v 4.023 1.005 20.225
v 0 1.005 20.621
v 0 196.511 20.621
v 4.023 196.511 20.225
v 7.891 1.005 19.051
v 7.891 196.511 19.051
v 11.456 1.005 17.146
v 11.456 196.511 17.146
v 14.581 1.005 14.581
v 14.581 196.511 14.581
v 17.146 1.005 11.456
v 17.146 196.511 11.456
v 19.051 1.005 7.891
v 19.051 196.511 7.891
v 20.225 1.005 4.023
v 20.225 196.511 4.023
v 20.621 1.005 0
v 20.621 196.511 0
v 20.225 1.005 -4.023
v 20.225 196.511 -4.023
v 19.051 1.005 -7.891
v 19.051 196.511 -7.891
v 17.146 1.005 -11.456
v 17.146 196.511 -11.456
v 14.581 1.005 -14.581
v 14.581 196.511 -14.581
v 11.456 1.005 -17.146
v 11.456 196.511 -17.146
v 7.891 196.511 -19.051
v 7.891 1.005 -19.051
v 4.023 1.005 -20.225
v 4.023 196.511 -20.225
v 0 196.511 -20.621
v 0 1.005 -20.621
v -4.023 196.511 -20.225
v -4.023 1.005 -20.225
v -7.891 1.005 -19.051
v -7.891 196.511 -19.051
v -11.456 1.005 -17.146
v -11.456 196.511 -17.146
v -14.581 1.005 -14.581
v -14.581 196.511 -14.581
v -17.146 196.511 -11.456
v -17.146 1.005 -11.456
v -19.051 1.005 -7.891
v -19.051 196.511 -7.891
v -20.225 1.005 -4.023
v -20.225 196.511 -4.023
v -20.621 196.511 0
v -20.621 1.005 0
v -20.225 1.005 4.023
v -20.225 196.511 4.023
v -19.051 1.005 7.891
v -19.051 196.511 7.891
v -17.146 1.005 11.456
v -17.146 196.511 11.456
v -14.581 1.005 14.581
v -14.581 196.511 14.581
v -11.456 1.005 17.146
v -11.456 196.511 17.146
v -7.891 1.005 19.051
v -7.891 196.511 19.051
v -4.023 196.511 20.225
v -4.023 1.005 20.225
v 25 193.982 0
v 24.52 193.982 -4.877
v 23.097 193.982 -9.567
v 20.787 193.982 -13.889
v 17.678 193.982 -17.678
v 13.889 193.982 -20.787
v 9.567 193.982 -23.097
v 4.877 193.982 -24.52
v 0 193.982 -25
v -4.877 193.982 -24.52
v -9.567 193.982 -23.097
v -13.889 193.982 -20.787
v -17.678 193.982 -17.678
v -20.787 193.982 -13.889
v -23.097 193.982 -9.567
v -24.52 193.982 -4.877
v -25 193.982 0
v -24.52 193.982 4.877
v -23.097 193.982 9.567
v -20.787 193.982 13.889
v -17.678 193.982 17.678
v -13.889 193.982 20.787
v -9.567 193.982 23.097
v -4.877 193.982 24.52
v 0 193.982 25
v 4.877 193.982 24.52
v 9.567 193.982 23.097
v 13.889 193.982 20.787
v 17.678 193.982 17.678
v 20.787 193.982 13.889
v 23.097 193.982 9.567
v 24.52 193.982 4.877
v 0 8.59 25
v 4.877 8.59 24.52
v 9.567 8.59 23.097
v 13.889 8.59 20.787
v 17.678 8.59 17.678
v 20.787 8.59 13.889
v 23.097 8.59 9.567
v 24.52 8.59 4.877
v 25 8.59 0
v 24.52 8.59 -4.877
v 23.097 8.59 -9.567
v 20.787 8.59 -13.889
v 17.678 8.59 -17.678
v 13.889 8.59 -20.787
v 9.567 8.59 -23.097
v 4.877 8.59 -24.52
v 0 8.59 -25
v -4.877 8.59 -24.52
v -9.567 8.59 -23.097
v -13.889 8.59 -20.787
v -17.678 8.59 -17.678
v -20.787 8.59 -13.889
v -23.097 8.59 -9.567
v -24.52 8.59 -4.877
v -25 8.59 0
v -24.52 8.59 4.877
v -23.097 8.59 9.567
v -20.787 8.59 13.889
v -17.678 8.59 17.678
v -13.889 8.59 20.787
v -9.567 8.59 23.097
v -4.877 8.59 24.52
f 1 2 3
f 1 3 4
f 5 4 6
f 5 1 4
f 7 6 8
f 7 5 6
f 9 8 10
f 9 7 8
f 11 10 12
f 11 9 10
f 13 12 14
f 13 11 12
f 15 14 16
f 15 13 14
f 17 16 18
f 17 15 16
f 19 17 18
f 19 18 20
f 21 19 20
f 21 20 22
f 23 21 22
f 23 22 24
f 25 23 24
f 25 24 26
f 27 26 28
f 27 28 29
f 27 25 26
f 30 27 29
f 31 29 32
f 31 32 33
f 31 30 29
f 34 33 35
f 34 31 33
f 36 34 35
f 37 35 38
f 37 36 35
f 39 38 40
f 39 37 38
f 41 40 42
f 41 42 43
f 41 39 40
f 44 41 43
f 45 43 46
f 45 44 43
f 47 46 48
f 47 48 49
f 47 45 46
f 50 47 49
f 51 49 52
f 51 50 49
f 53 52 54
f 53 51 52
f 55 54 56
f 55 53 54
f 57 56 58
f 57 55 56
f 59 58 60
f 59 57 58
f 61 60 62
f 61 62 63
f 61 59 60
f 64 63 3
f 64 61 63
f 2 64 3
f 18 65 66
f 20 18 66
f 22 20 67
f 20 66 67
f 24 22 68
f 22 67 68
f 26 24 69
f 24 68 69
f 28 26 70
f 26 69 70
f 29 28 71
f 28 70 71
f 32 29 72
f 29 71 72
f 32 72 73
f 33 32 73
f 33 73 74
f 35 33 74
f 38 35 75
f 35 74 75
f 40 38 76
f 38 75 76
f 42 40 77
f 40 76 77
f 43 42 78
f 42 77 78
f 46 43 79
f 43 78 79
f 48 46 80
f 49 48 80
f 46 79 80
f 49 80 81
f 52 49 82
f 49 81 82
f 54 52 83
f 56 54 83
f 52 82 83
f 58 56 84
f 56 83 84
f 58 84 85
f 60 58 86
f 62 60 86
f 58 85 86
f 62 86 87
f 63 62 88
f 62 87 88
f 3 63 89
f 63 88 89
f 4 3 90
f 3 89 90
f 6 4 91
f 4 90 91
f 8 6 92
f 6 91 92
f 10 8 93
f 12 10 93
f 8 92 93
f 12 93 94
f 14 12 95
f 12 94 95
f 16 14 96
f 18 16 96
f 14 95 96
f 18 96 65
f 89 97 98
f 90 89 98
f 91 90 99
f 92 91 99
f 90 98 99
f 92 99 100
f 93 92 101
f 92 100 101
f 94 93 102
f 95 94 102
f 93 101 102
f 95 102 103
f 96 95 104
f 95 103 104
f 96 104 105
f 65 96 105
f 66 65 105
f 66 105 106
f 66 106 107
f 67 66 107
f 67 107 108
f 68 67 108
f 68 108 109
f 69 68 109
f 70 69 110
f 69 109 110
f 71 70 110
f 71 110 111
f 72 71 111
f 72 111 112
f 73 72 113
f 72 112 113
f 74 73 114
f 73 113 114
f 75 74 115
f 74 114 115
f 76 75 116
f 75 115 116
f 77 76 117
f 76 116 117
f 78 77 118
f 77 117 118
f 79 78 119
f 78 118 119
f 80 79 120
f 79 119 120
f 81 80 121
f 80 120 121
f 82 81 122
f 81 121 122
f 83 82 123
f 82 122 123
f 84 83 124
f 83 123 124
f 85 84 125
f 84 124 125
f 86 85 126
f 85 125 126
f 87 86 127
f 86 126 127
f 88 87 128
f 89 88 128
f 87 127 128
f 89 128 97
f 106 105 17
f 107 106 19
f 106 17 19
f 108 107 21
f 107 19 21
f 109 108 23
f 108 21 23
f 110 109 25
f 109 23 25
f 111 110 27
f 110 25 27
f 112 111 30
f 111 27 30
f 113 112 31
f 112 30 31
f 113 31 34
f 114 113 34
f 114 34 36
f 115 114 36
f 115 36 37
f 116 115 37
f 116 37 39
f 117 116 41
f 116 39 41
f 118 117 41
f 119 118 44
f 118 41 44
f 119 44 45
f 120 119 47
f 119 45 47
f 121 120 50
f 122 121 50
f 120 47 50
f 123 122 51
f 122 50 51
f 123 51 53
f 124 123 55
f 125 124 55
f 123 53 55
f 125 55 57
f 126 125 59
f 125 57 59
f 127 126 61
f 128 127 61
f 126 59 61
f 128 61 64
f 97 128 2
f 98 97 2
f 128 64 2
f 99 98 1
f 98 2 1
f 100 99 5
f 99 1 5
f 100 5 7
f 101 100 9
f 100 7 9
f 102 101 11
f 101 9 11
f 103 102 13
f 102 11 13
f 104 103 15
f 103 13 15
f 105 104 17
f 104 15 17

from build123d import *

# Parameters (mm, degrees)
SKETCH1_R           = 25
BOSS_EXTRUDE1_DEPTH = 198.941748
SKETCH2_R           = 20.620747434
CUT_EXTRUDE1_DEPTH  = 203.05894956


with BuildPart() as part:
    # Sketch1 → Boss-Extrude1 (new body)
    with BuildSketch(Plane(origin=(0, 0, 0), x_dir=(1, 0, 0), z_dir=(0, 1, 0))):
        with Locations(Location((0, 0, 0), (0, 0, 270))):
            Circle(SKETCH1_R)
    extrude(amount=BOSS_EXTRUDE1_DEPTH)

    # Sketch2 → Cut-Extrude1 (cut, through all)
    with BuildSketch(Plane(origin=(0, 0, 0), x_dir=(1, 0, 0), z_dir=(0, 1, 0))):
        with Locations(Location((0, 0, 0), (0, 0, 270))):
            Circle(SKETCH2_R)
    extrude(amount=CUT_EXTRUDE1_DEPTH, mode=Mode.SUBTRACT)

    # Chamfer1: read off the stored shape, not the designer's step
    # Chamfer1 outline → Chamfer1 (revolve, cut)
    with BuildSketch(Plane.XY):
        Polygon((25, 193.982213725), (25, 198.94174834), (20.620747434, 198.94174834), (20.620747434, 196.510576373), align=None)
        Polygon((25, 8.590165934), (20.620747434, 1.005077991), (20.620747434, 0), (25, 0), align=None)
    revolve(axis=Axis((0, 0, 0), (0, 1, 0)), mode=Mode.SUBTRACT)


solid = part.part
